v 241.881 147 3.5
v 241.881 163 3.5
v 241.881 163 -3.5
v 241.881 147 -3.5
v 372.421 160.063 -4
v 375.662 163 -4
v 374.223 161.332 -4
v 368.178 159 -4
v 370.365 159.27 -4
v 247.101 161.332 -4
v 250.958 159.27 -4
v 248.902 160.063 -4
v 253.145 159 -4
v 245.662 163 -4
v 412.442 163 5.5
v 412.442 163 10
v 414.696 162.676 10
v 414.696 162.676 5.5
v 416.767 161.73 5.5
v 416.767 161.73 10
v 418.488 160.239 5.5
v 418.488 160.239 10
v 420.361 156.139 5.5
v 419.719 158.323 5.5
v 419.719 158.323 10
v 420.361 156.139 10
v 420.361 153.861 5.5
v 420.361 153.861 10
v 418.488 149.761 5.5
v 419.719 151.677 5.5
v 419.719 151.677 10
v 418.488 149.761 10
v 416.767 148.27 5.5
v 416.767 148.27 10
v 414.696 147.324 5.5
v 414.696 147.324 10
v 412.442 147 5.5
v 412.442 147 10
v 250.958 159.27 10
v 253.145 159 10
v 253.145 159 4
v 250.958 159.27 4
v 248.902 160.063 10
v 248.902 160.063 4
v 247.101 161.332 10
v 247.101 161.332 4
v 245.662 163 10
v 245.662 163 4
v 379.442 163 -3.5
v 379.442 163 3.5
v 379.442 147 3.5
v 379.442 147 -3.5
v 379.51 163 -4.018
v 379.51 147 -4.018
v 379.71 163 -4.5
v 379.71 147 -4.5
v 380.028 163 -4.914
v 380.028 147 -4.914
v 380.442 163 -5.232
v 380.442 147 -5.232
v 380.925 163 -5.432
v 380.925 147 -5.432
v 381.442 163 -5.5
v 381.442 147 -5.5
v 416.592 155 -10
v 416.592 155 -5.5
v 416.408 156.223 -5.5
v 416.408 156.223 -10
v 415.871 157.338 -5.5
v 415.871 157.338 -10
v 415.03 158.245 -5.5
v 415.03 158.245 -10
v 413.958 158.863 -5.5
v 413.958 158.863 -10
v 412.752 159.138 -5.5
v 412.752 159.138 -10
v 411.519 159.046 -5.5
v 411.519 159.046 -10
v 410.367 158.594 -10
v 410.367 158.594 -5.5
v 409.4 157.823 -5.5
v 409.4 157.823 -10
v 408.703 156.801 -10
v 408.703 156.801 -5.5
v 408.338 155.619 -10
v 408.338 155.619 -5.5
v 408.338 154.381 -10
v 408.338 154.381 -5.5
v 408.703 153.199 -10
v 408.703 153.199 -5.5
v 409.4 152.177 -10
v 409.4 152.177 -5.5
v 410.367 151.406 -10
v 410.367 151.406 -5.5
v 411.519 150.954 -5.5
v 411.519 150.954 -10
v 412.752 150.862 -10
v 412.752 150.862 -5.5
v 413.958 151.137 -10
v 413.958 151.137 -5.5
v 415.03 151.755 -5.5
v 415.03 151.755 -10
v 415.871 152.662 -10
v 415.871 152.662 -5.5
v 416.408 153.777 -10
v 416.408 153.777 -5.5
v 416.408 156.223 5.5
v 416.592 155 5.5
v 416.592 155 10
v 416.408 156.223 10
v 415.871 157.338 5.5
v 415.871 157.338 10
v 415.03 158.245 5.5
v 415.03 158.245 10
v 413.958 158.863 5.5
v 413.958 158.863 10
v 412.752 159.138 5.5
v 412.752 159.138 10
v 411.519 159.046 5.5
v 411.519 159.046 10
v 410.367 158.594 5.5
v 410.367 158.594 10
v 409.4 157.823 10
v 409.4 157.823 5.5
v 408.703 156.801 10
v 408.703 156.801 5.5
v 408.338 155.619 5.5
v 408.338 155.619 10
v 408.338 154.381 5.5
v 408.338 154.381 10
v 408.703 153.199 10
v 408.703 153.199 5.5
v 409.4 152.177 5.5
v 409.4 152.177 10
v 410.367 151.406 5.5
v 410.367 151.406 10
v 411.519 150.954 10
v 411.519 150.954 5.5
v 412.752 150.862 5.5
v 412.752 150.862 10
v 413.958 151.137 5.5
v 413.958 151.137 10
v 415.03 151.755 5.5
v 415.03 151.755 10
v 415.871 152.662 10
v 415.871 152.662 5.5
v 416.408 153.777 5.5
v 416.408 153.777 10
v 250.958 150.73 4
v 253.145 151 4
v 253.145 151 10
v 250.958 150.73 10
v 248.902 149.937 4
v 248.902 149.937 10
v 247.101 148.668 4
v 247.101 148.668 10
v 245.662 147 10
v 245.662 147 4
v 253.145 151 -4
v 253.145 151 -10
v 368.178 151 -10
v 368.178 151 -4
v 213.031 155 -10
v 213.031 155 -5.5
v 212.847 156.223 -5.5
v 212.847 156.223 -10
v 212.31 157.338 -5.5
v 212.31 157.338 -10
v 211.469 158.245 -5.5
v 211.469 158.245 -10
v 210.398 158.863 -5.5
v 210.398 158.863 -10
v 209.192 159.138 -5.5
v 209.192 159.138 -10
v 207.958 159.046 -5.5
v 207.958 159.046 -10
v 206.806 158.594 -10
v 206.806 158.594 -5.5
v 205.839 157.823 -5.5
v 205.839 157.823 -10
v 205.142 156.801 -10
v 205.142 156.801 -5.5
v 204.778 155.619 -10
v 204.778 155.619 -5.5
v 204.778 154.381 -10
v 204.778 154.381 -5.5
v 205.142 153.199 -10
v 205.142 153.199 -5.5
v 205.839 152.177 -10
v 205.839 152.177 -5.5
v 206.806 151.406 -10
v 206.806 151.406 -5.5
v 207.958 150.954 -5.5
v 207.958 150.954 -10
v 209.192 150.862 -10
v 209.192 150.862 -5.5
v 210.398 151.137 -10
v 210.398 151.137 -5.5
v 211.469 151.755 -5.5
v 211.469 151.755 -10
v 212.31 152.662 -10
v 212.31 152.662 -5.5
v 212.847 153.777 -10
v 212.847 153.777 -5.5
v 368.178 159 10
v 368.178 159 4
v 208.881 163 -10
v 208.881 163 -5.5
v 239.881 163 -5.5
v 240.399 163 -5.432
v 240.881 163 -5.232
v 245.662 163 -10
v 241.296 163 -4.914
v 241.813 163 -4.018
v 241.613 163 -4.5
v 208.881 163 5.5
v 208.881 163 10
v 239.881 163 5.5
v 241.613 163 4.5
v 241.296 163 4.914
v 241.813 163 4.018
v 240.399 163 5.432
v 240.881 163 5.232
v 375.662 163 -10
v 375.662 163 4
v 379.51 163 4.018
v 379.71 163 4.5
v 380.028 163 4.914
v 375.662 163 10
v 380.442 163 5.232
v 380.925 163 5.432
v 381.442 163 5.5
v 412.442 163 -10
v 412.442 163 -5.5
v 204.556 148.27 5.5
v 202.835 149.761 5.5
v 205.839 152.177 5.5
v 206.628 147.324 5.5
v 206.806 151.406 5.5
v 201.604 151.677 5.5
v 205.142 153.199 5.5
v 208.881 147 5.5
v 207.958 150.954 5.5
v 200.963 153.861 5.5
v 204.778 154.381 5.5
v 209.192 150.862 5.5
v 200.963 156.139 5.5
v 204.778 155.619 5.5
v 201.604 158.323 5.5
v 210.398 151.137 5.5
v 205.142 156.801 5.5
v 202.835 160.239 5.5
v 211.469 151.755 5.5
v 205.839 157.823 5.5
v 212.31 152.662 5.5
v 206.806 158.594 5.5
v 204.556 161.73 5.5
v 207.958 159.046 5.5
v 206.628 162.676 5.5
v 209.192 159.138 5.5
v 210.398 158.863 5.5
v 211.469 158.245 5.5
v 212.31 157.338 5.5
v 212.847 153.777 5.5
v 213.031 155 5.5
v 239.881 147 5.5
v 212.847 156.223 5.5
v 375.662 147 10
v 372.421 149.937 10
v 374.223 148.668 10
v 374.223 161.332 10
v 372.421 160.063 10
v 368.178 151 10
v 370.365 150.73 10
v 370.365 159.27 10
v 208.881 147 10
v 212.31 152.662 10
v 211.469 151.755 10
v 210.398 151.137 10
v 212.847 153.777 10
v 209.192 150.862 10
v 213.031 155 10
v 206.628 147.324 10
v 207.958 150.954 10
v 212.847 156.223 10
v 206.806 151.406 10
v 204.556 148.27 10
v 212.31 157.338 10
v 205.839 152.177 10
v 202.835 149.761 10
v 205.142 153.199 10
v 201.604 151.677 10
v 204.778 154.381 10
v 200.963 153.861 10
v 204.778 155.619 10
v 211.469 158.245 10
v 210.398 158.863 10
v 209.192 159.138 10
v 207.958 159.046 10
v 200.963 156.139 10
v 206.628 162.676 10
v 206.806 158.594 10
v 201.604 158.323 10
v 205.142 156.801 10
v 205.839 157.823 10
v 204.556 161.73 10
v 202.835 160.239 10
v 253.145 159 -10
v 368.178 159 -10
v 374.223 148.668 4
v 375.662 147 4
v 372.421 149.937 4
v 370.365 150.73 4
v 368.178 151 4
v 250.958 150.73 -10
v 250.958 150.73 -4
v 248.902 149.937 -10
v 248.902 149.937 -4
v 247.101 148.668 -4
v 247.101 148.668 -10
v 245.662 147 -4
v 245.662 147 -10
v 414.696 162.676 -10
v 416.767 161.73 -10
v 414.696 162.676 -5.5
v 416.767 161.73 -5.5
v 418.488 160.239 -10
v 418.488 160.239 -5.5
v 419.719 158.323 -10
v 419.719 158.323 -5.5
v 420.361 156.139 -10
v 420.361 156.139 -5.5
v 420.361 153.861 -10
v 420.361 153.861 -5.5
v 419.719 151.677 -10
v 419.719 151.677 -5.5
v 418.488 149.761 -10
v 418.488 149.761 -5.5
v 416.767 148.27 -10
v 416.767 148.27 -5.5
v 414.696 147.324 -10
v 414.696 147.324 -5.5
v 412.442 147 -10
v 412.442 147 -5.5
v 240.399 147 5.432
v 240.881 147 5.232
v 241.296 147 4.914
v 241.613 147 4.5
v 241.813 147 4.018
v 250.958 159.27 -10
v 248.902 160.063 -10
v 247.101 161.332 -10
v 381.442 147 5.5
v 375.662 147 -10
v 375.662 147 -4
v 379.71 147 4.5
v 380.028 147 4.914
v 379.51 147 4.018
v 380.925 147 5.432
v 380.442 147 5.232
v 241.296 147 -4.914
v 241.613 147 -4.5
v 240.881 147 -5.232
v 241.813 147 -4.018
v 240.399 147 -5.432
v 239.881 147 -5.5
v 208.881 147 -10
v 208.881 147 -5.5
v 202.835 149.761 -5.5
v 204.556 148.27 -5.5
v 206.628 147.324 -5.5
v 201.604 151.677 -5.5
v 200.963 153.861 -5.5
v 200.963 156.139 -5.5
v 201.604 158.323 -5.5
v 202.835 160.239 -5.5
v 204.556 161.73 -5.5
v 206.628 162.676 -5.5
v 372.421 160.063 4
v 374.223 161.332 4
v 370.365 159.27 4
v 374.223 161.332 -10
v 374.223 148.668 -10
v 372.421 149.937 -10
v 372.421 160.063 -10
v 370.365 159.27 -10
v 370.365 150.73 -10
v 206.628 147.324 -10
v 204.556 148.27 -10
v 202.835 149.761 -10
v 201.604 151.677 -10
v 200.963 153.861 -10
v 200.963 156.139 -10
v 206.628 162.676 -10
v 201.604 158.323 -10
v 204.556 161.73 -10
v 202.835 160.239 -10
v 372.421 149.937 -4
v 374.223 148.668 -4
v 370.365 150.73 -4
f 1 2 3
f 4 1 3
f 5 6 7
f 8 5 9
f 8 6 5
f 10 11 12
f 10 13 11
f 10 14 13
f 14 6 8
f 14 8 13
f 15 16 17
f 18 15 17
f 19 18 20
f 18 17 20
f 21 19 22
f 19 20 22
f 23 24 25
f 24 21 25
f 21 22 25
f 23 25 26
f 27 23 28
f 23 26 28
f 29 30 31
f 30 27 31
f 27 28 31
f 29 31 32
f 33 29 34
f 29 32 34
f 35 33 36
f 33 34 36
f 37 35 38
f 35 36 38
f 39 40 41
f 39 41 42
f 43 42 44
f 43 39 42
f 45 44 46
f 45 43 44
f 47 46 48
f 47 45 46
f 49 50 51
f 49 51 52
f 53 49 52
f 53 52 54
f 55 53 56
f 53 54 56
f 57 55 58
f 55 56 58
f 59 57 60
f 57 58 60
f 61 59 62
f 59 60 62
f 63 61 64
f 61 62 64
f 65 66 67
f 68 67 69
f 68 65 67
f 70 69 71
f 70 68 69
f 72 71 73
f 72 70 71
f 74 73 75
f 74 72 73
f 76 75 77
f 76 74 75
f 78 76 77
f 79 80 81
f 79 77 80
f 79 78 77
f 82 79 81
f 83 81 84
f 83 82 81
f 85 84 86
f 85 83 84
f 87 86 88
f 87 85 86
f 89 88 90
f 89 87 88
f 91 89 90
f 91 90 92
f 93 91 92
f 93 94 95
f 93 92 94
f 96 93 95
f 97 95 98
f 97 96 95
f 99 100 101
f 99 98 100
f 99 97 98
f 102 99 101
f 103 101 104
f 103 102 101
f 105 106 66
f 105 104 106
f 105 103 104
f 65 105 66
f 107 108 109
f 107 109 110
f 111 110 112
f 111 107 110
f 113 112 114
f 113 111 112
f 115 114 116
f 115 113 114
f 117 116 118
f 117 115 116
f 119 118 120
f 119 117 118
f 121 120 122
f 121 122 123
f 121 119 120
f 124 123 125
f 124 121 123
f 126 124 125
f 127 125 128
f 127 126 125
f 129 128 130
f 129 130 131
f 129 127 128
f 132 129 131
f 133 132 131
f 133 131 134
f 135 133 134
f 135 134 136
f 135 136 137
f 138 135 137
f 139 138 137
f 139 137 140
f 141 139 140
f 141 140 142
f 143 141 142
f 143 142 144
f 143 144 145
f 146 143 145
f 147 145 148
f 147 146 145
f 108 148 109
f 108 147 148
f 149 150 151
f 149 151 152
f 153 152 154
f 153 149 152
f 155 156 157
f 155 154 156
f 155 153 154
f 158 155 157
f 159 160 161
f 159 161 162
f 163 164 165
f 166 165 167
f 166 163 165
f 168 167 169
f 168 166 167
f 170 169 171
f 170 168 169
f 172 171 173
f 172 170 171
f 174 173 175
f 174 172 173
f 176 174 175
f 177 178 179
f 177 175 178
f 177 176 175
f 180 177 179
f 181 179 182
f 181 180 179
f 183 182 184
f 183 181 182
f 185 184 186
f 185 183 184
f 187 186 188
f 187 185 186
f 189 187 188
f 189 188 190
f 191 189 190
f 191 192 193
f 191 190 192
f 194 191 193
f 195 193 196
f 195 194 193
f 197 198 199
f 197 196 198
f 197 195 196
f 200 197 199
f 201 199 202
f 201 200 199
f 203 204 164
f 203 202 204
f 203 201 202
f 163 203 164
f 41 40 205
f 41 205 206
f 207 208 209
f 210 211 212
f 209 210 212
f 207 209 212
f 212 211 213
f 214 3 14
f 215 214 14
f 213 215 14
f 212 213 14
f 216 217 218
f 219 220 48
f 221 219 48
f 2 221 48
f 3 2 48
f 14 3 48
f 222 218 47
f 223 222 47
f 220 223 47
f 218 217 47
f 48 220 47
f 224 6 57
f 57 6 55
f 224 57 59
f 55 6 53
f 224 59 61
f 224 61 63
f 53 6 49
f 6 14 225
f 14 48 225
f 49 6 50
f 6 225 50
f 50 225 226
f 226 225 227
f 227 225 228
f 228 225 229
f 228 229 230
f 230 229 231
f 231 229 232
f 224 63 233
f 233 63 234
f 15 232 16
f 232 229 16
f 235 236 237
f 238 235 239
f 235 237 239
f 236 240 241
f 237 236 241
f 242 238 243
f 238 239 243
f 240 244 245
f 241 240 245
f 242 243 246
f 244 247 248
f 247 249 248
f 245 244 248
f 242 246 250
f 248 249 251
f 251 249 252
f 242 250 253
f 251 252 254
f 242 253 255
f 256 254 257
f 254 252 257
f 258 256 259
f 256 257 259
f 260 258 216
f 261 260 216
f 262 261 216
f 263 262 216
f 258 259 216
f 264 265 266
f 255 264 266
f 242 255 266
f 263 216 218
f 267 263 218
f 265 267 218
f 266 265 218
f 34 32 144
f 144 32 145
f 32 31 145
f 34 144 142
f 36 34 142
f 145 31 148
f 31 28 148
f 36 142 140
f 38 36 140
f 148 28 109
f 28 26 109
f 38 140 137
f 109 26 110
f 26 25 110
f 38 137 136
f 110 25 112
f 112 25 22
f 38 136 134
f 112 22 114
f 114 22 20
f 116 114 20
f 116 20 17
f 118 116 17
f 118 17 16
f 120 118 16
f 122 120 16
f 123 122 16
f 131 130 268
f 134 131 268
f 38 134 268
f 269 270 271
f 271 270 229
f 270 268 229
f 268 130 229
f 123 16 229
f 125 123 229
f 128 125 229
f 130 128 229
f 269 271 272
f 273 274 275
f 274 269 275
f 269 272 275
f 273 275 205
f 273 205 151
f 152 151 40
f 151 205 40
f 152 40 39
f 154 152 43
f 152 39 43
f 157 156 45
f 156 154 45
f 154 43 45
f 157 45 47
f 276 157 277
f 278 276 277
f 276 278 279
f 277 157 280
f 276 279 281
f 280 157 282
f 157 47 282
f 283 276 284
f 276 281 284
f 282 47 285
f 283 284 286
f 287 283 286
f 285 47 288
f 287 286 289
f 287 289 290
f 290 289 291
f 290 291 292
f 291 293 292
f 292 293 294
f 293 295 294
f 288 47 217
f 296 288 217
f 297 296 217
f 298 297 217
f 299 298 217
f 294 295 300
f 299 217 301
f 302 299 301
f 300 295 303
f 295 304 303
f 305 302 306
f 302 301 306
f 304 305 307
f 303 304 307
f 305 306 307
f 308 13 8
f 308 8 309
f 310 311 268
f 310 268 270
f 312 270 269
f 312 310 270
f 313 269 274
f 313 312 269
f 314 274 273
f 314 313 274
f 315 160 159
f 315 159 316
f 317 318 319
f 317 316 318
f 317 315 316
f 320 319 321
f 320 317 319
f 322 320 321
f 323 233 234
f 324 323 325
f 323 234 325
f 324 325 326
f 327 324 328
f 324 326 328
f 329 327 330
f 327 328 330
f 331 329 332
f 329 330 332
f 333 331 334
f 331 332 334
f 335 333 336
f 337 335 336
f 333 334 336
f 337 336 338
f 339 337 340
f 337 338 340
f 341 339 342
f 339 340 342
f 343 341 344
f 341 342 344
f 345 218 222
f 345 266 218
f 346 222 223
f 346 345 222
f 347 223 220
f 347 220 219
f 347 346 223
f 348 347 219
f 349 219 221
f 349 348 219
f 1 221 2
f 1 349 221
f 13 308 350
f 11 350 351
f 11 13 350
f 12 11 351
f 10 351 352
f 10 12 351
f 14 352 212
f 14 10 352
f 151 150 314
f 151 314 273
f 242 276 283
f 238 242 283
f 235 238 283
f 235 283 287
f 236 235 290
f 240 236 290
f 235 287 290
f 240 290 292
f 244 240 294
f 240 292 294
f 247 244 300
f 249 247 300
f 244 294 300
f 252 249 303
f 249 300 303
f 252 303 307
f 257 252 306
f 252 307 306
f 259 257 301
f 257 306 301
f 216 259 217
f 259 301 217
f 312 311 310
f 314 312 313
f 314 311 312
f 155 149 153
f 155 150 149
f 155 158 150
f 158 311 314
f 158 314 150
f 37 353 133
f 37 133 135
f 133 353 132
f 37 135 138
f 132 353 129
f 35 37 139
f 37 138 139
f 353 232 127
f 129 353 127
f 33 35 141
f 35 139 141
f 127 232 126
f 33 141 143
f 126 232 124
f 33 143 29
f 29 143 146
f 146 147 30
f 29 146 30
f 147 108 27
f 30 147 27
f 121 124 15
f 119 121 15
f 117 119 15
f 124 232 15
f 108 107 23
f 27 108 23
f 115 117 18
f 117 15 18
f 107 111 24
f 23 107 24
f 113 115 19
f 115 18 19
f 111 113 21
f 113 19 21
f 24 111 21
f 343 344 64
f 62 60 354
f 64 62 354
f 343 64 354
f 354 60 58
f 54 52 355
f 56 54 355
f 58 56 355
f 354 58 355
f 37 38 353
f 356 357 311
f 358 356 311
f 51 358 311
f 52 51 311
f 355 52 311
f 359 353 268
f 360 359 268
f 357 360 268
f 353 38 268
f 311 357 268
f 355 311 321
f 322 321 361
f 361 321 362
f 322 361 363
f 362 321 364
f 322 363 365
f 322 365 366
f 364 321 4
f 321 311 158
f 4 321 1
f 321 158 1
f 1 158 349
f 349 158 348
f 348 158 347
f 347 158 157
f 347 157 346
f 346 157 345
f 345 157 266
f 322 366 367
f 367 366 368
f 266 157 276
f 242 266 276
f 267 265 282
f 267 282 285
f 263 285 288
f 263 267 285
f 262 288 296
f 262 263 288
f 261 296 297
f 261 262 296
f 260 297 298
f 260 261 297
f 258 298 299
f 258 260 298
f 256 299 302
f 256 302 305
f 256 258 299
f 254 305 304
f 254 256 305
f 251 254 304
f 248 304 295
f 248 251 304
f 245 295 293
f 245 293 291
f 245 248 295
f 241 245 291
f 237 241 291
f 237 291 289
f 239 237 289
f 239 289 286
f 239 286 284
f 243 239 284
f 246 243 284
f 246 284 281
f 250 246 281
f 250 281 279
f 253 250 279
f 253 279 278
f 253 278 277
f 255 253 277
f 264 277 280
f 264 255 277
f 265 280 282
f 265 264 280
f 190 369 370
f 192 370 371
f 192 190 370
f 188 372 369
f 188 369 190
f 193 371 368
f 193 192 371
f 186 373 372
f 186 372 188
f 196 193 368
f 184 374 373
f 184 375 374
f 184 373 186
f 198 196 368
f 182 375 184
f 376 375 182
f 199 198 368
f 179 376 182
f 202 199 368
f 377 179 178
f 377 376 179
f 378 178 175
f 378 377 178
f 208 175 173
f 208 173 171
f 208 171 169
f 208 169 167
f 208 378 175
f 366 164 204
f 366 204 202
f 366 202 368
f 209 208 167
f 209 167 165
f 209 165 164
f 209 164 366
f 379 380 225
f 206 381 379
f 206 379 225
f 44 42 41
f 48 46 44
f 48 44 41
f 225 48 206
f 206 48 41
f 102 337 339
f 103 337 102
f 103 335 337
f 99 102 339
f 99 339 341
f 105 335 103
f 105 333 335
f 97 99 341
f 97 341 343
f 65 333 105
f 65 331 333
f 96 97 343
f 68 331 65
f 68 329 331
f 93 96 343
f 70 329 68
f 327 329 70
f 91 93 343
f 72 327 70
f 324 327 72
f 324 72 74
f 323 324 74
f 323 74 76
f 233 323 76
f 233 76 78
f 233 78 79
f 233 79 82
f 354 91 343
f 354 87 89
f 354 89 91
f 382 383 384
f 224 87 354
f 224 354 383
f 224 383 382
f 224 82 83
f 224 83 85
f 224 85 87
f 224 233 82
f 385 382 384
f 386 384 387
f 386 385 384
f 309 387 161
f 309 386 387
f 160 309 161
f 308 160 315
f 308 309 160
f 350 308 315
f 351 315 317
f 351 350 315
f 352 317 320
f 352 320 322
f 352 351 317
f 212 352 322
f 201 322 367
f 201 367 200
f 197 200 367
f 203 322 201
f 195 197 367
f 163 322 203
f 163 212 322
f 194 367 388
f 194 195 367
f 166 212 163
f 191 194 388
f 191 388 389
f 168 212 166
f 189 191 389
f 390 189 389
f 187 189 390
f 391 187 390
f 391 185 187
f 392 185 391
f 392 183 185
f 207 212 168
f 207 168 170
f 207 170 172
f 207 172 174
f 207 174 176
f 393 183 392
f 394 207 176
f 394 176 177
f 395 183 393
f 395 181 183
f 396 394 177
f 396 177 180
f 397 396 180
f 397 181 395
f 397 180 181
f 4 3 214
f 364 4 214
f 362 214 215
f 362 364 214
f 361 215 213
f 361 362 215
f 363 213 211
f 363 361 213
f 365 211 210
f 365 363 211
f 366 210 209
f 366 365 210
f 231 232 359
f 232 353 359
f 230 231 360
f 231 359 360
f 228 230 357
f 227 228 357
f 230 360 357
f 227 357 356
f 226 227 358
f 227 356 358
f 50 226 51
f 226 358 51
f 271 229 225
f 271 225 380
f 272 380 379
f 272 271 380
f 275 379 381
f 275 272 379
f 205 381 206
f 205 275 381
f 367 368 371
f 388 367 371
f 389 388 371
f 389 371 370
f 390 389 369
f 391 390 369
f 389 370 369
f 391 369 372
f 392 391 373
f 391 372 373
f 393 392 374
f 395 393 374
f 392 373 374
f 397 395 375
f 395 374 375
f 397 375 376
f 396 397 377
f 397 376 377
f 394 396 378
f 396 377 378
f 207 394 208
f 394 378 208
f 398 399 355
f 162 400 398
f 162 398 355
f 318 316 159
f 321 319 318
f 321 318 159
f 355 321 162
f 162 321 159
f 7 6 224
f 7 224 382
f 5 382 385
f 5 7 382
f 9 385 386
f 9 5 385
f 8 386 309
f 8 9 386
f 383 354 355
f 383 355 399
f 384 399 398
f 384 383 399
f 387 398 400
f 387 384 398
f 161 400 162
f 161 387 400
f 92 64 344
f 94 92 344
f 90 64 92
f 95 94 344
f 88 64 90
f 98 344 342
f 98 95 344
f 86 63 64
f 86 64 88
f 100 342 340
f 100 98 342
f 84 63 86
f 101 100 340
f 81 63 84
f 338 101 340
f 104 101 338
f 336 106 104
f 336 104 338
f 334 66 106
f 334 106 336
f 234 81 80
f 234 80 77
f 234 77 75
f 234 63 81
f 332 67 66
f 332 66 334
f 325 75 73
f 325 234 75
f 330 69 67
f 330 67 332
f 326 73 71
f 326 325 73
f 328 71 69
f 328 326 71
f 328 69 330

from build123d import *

# Parameters (mm, degrees)
ESBO_O1_R                = 4.15
RESSALTO_EXTRUS_O1_DEPTH = 10
ESBO_O2_W                = 41
ESBO_O2_H                = 11
CORTE_EXTRUS_O1_DEPTH    = 421.865295251
FILETE1_R                = 2
ESBO_O3_W                = 41
ESBO_O3_H                = 11
CORTE_EXTRUS_O2_DEPTH    = 421.865295251
ESBO_O4_W                = 130
ESBO_O4_H                = 51.333908156
CORTE_EXTRUS_O3_DEPTH    = 452.376336051
RESSALTO_EXTRUS_O2_DEPTH = 130
FILETE2_R                = 9
FILETE3_R                = 2


with BuildPart() as part:
    # Esboço1 → Ressalto-extrusão1 (new, symmetric)
    with BuildSketch(Plane.XY):
        with BuildLine():
            Line((208.88140452, 163), (412.442144352, 163))
            ThreePointArc((412.442144352, 163), (420.442144352, 155), (412.442144352, 147))
            Line((412.442144352, 147), (208.88140452, 147))
            ThreePointArc((208.88140452, 147), (200.88140452, 155), (208.88140452, 163))
        make_face()
        with Locations((208.88140452, 155)):
            Circle(ESBO_O1_R, mode=Mode.SUBTRACT)
        with Locations((412.442144352, 155)):
            Circle(ESBO_O1_R, mode=Mode.SUBTRACT)
    extrude(amount=RESSALTO_EXTRUS_O1_DEPTH, both=True)

    # Esboço2 → Corte-extrusão1 (cut, through all)
    with BuildSketch(Plane(origin=(0, 163, 0), x_dir=(1, 0, 0), z_dir=(0, 1, 0))):
        with Locations((221.38140452, 0)):
            Rectangle(ESBO_O2_W, ESBO_O2_H)
    extrude(amount=-CORTE_EXTRUS_O1_DEPTH, mode=Mode.SUBTRACT)

    # Filete1
    filete1_edges = [part.edges().sort_by_distance(p)[0] for p in [
        (241.88140452, 155, 5.5),
        (241.88140452, 155, -5.5),
    ]]
    fillet(filete1_edges, radius=FILETE1_R)

    # Esboço3 → Corte-extrusão2 (cut, through all)
    with BuildSketch(Plane(origin=(0, 163, 0), x_dir=(1, 0, 0), z_dir=(0, 1, 0))):
        with Locations((399.942144352, 0)):
            Rectangle(ESBO_O3_W, ESBO_O3_H)
    extrude(amount=-CORTE_EXTRUS_O2_DEPTH, mode=Mode.SUBTRACT)

    # Esboço4 → Corte-extrusão3 (cut, through all)
    with BuildSketch(Plane.XY.offset(10)):
        with Locations((310.661774436, 149.883332027)):
            Rectangle(ESBO_O4_W, ESBO_O4_H)
    extrude(amount=-CORTE_EXTRUS_O3_DEPTH, mode=Mode.SUBTRACT)


with BuildPart() as corte_extrus_o3_piece_1:
    # of the separate pieces the step leaves, piece 1, a body of its own (corte_extrus_o3_pieces)
    add(part.part.solids().sort_by_distance((241.88140452, 163, -3.5))[0])



with BuildPart() as corte_extrus_o3_piece_2:
    # of the separate pieces the step leaves, piece 2, a body of its own (corte_extrus_o3_pieces)
    add(part.part.solids().sort_by_distance((375.661774436, 163, -10))[0])


with BuildPart() as corte_extrus_o3_piece_1_1:
    add(corte_extrus_o3_piece_1.part)

    add(corte_extrus_o3_piece_2.part)  # Ressalto-extrusão2 merges Corte-extrusão3 piece 2
    # Esboço5 → Ressalto-extrusão2 (add)
    with BuildSketch(Plane(origin=(245.661774436, 0, 0), x_dir=(0, 0, -1), z_dir=(1, 0, 0))):
        Polygon((-4, 147), (-4, 151), (-10, 151), (-10, 159), (-4, 159), (-4, 163), (4, 163), (4, 159), (10, 159), (10, 151), (4, 151), (4, 147), align=None)
    extrude(amount=RESSALTO_EXTRUS_O2_DEPTH)

    # Filete2
    # the kernel refuses this fillet: 9 mm, written as the material it adds along each edge
    with BuildSketch(Plane(origin=(375.661774436, 151, -10), x_dir=(0, -1, 0), z_dir=(0, 0, 1))) as filete2_piece_1_section:
        with BuildLine():
            CenterArc((9, -7.483314774), FILETE2_R, 123.748988596, 56.251011404)
            Line((0, -7.483314774), (-0.18, -7.483314774))
            Line((-0.18, -7.483314774), (-0.18, 0))
            Line((-0.18, 0), (0, 0.18))
            ThreePointArc((0, 0.18), (2, 0.18), (3.9, 0.149666295))
            Line((3.9, 0.149666295), (4, 0))
        make_face()
    filete2_piece_1 = extrude(amount=24.708286934, mode=Mode.PRIVATE)
    filete2_piece_1 = split(filete2_piece_1, bisect_by=Plane(origin=(373.762740139, 149.968595049, 10), z_dir=(0, 0, -1)), keep=Keep.TOP, mode=Mode.PRIVATE)
    add(filete2_piece_1)
    with BuildSketch(Plane(origin=(375.661774436, 151, -14.708286934), x_dir=(0, -1, 0), z_dir=(0, 0, 1))) as filete2_piece_2_section:
        with BuildLine():
            CenterArc((9, -7.483314774), FILETE2_R, 123.748988596, 56.251011404)
            Line((0, -7.483314774), (-0.18, -7.483314774))
            Line((-0.18, -7.483314774), (-0.18, 0))
            Line((-0.18, 0), (0, 0.18))
            ThreePointArc((0, 0.18), (2, 0.18), (3.9, 0.149666295))
            Line((3.9, 0.149666295), (4, 0))
        make_face()
    filete2_piece_2 = extrude(amount=24.708286934, mode=Mode.PRIVATE)
    filete2_piece_2 = split(filete2_piece_2, bisect_by=Plane(origin=(373.762740139, 149.968595049, -10), z_dir=(0, 0, 1)), keep=Keep.TOP, mode=Mode.PRIVATE)
    add(filete2_piece_2)
    with BuildSketch(Plane(origin=(375.661774436, 159, 10), x_dir=(0, 1, 0), z_dir=(0, 0, -1))) as filete2_piece_3_section:
        with BuildLine():
            CenterArc((9, -7.483314774), FILETE2_R, 123.748988596, 56.251011404)
            Line((0, -7.483314774), (-0.18, -7.483314774))
            Line((-0.18, -7.483314774), (-0.18, 0))
            Line((-0.18, 0), (0, 0.18))
            ThreePointArc((0, 0.18), (2, 0.18), (3.9, 0.149666295))
            Line((3.9, 0.149666295), (4, 0))
        make_face()
    filete2_piece_3 = extrude(amount=24.708286934, mode=Mode.PRIVATE)
    filete2_piece_3 = split(filete2_piece_3, bisect_by=Plane(origin=(373.762740139, 160.031404951, -10), z_dir=(0, 0, 1)), keep=Keep.TOP, mode=Mode.PRIVATE)
    add(filete2_piece_3)
    with BuildSketch(Plane(origin=(375.661774436, 159, 14.708286934), x_dir=(0, 1, 0), z_dir=(0, 0, -1))) as filete2_piece_4_section:
        with BuildLine():
            CenterArc((9, -7.483314774), FILETE2_R, 123.748988596, 56.251011404)
            Line((0, -7.483314774), (-0.18, -7.483314774))
            Line((-0.18, -7.483314774), (-0.18, 0))
            Line((-0.18, 0), (0, 0.18))
            ThreePointArc((0, 0.18), (2, 0.18), (3.9, 0.149666295))
            Line((3.9, 0.149666295), (4, 0))
        make_face()
    filete2_piece_4 = extrude(amount=24.708286934, mode=Mode.PRIVATE)
    filete2_piece_4 = split(filete2_piece_4, bisect_by=Plane(origin=(373.762740139, 160.031404951, 10), z_dir=(0, 0, -1)), keep=Keep.TOP, mode=Mode.PRIVATE)
    add(filete2_piece_4)
    with BuildSketch(Plane(origin=(245.661774436, 151, -10), x_dir=(1, 0, 0), z_dir=(0, 0, 1))) as filete2_piece_5_section:
        with BuildLine():
            CenterArc((7.483314774, -9), FILETE2_R, 90, 56.251011404)
            Line((0, -4), (-0.149666295, -3.9))
            ThreePointArc((-0.149666295, -3.9), (-0.18, -2), (-0.18, 0))
            Line((-0.18, 0), (0, 0.18))
            Line((0, 0.18), (7.483314774, 0.18))
            Line((7.483314774, 0.18), (7.483314774, 0))
        make_face()
    filete2_piece_5 = extrude(amount=24.708286934, mode=Mode.PRIVATE)
    filete2_piece_5 = split(filete2_piece_5, bisect_by=Plane(origin=(247.560808733, 149.968595049, 10), z_dir=(0, 0, -1)), keep=Keep.TOP, mode=Mode.PRIVATE)
    add(filete2_piece_5)
    with BuildSketch(Plane(origin=(245.661774436, 151, -14.708286934), x_dir=(1, 0, 0), z_dir=(0, 0, 1))) as filete2_piece_6_section:
        with BuildLine():
            CenterArc((7.483314774, -9), FILETE2_R, 90, 56.251011404)
            Line((0, -4), (-0.149666295, -3.9))
            ThreePointArc((-0.149666295, -3.9), (-0.18, -2), (-0.18, 0))
            Line((-0.18, 0), (0, 0.18))
            Line((0, 0.18), (7.483314774, 0.18))
            Line((7.483314774, 0.18), (7.483314774, 0))
        make_face()
    filete2_piece_6 = extrude(amount=24.708286934, mode=Mode.PRIVATE)
    filete2_piece_6 = split(filete2_piece_6, bisect_by=Plane(origin=(247.560808733, 149.968595049, -10), z_dir=(0, 0, 1)), keep=Keep.TOP, mode=Mode.PRIVATE)
    add(filete2_piece_6)
    with BuildSketch(Plane(origin=(245.661774436, 159, 14.708286934), x_dir=(1, 0, 0), z_dir=(0, 0, -1))) as filete2_piece_7_section:
        with BuildLine():
            CenterArc((7.483314774, -9), FILETE2_R, 90, 56.251011404)
            Line((0, -4), (-0.149666295, -3.9))
            ThreePointArc((-0.149666295, -3.9), (-0.18, -2), (-0.18, 0))
            Line((-0.18, 0), (0, 0.18))
            Line((0, 0.18), (7.483314774, 0.18))
            Line((7.483314774, 0.18), (7.483314774, 0))
        make_face()
    filete2_piece_7 = extrude(amount=24.708286934, mode=Mode.PRIVATE)
    filete2_piece_7 = split(filete2_piece_7, bisect_by=Plane(origin=(247.560808733, 160.031404951, 10), z_dir=(0, 0, -1)), keep=Keep.TOP, mode=Mode.PRIVATE)
    add(filete2_piece_7)
    with BuildSketch(Plane(origin=(245.661774436, 159, 10), x_dir=(0, 1, 0), z_dir=(0, 0, -1))) as filete2_piece_8_section:
        with BuildLine():
            CenterArc((9, 7.483314774), FILETE2_R, 180, 56.251011404)
            Line((0, 7.483314774), (-0.18, 7.483314774))
            Line((-0.18, 7.483314774), (-0.18, 0))
            Line((-0.18, 0), (0, -0.18))
            ThreePointArc((0, -0.18), (2, -0.18), (3.9, -0.149666295))
            Line((3.9, -0.149666295), (4, 0))
        make_face()
    filete2_piece_8 = extrude(amount=24.708286934, mode=Mode.PRIVATE)
    filete2_piece_8 = split(filete2_piece_8, bisect_by=Plane(origin=(247.560808733, 160.031404951, -10), z_dir=(0, 0, 1)), keep=Keep.TOP, mode=Mode.PRIVATE)
    add(filete2_piece_8)

    # Filete3
    filete3_edges = [corte_extrus_o3_piece_1_1.edges().sort_by_distance(p)[0] for p in [
        (379.442144352, 155, 5.5),
        (379.442144352, 155, -5.5),
    ]]
    fillet(filete3_edges, radius=FILETE3_R)


solid = corte_extrus_o3_piece_1_1.part
